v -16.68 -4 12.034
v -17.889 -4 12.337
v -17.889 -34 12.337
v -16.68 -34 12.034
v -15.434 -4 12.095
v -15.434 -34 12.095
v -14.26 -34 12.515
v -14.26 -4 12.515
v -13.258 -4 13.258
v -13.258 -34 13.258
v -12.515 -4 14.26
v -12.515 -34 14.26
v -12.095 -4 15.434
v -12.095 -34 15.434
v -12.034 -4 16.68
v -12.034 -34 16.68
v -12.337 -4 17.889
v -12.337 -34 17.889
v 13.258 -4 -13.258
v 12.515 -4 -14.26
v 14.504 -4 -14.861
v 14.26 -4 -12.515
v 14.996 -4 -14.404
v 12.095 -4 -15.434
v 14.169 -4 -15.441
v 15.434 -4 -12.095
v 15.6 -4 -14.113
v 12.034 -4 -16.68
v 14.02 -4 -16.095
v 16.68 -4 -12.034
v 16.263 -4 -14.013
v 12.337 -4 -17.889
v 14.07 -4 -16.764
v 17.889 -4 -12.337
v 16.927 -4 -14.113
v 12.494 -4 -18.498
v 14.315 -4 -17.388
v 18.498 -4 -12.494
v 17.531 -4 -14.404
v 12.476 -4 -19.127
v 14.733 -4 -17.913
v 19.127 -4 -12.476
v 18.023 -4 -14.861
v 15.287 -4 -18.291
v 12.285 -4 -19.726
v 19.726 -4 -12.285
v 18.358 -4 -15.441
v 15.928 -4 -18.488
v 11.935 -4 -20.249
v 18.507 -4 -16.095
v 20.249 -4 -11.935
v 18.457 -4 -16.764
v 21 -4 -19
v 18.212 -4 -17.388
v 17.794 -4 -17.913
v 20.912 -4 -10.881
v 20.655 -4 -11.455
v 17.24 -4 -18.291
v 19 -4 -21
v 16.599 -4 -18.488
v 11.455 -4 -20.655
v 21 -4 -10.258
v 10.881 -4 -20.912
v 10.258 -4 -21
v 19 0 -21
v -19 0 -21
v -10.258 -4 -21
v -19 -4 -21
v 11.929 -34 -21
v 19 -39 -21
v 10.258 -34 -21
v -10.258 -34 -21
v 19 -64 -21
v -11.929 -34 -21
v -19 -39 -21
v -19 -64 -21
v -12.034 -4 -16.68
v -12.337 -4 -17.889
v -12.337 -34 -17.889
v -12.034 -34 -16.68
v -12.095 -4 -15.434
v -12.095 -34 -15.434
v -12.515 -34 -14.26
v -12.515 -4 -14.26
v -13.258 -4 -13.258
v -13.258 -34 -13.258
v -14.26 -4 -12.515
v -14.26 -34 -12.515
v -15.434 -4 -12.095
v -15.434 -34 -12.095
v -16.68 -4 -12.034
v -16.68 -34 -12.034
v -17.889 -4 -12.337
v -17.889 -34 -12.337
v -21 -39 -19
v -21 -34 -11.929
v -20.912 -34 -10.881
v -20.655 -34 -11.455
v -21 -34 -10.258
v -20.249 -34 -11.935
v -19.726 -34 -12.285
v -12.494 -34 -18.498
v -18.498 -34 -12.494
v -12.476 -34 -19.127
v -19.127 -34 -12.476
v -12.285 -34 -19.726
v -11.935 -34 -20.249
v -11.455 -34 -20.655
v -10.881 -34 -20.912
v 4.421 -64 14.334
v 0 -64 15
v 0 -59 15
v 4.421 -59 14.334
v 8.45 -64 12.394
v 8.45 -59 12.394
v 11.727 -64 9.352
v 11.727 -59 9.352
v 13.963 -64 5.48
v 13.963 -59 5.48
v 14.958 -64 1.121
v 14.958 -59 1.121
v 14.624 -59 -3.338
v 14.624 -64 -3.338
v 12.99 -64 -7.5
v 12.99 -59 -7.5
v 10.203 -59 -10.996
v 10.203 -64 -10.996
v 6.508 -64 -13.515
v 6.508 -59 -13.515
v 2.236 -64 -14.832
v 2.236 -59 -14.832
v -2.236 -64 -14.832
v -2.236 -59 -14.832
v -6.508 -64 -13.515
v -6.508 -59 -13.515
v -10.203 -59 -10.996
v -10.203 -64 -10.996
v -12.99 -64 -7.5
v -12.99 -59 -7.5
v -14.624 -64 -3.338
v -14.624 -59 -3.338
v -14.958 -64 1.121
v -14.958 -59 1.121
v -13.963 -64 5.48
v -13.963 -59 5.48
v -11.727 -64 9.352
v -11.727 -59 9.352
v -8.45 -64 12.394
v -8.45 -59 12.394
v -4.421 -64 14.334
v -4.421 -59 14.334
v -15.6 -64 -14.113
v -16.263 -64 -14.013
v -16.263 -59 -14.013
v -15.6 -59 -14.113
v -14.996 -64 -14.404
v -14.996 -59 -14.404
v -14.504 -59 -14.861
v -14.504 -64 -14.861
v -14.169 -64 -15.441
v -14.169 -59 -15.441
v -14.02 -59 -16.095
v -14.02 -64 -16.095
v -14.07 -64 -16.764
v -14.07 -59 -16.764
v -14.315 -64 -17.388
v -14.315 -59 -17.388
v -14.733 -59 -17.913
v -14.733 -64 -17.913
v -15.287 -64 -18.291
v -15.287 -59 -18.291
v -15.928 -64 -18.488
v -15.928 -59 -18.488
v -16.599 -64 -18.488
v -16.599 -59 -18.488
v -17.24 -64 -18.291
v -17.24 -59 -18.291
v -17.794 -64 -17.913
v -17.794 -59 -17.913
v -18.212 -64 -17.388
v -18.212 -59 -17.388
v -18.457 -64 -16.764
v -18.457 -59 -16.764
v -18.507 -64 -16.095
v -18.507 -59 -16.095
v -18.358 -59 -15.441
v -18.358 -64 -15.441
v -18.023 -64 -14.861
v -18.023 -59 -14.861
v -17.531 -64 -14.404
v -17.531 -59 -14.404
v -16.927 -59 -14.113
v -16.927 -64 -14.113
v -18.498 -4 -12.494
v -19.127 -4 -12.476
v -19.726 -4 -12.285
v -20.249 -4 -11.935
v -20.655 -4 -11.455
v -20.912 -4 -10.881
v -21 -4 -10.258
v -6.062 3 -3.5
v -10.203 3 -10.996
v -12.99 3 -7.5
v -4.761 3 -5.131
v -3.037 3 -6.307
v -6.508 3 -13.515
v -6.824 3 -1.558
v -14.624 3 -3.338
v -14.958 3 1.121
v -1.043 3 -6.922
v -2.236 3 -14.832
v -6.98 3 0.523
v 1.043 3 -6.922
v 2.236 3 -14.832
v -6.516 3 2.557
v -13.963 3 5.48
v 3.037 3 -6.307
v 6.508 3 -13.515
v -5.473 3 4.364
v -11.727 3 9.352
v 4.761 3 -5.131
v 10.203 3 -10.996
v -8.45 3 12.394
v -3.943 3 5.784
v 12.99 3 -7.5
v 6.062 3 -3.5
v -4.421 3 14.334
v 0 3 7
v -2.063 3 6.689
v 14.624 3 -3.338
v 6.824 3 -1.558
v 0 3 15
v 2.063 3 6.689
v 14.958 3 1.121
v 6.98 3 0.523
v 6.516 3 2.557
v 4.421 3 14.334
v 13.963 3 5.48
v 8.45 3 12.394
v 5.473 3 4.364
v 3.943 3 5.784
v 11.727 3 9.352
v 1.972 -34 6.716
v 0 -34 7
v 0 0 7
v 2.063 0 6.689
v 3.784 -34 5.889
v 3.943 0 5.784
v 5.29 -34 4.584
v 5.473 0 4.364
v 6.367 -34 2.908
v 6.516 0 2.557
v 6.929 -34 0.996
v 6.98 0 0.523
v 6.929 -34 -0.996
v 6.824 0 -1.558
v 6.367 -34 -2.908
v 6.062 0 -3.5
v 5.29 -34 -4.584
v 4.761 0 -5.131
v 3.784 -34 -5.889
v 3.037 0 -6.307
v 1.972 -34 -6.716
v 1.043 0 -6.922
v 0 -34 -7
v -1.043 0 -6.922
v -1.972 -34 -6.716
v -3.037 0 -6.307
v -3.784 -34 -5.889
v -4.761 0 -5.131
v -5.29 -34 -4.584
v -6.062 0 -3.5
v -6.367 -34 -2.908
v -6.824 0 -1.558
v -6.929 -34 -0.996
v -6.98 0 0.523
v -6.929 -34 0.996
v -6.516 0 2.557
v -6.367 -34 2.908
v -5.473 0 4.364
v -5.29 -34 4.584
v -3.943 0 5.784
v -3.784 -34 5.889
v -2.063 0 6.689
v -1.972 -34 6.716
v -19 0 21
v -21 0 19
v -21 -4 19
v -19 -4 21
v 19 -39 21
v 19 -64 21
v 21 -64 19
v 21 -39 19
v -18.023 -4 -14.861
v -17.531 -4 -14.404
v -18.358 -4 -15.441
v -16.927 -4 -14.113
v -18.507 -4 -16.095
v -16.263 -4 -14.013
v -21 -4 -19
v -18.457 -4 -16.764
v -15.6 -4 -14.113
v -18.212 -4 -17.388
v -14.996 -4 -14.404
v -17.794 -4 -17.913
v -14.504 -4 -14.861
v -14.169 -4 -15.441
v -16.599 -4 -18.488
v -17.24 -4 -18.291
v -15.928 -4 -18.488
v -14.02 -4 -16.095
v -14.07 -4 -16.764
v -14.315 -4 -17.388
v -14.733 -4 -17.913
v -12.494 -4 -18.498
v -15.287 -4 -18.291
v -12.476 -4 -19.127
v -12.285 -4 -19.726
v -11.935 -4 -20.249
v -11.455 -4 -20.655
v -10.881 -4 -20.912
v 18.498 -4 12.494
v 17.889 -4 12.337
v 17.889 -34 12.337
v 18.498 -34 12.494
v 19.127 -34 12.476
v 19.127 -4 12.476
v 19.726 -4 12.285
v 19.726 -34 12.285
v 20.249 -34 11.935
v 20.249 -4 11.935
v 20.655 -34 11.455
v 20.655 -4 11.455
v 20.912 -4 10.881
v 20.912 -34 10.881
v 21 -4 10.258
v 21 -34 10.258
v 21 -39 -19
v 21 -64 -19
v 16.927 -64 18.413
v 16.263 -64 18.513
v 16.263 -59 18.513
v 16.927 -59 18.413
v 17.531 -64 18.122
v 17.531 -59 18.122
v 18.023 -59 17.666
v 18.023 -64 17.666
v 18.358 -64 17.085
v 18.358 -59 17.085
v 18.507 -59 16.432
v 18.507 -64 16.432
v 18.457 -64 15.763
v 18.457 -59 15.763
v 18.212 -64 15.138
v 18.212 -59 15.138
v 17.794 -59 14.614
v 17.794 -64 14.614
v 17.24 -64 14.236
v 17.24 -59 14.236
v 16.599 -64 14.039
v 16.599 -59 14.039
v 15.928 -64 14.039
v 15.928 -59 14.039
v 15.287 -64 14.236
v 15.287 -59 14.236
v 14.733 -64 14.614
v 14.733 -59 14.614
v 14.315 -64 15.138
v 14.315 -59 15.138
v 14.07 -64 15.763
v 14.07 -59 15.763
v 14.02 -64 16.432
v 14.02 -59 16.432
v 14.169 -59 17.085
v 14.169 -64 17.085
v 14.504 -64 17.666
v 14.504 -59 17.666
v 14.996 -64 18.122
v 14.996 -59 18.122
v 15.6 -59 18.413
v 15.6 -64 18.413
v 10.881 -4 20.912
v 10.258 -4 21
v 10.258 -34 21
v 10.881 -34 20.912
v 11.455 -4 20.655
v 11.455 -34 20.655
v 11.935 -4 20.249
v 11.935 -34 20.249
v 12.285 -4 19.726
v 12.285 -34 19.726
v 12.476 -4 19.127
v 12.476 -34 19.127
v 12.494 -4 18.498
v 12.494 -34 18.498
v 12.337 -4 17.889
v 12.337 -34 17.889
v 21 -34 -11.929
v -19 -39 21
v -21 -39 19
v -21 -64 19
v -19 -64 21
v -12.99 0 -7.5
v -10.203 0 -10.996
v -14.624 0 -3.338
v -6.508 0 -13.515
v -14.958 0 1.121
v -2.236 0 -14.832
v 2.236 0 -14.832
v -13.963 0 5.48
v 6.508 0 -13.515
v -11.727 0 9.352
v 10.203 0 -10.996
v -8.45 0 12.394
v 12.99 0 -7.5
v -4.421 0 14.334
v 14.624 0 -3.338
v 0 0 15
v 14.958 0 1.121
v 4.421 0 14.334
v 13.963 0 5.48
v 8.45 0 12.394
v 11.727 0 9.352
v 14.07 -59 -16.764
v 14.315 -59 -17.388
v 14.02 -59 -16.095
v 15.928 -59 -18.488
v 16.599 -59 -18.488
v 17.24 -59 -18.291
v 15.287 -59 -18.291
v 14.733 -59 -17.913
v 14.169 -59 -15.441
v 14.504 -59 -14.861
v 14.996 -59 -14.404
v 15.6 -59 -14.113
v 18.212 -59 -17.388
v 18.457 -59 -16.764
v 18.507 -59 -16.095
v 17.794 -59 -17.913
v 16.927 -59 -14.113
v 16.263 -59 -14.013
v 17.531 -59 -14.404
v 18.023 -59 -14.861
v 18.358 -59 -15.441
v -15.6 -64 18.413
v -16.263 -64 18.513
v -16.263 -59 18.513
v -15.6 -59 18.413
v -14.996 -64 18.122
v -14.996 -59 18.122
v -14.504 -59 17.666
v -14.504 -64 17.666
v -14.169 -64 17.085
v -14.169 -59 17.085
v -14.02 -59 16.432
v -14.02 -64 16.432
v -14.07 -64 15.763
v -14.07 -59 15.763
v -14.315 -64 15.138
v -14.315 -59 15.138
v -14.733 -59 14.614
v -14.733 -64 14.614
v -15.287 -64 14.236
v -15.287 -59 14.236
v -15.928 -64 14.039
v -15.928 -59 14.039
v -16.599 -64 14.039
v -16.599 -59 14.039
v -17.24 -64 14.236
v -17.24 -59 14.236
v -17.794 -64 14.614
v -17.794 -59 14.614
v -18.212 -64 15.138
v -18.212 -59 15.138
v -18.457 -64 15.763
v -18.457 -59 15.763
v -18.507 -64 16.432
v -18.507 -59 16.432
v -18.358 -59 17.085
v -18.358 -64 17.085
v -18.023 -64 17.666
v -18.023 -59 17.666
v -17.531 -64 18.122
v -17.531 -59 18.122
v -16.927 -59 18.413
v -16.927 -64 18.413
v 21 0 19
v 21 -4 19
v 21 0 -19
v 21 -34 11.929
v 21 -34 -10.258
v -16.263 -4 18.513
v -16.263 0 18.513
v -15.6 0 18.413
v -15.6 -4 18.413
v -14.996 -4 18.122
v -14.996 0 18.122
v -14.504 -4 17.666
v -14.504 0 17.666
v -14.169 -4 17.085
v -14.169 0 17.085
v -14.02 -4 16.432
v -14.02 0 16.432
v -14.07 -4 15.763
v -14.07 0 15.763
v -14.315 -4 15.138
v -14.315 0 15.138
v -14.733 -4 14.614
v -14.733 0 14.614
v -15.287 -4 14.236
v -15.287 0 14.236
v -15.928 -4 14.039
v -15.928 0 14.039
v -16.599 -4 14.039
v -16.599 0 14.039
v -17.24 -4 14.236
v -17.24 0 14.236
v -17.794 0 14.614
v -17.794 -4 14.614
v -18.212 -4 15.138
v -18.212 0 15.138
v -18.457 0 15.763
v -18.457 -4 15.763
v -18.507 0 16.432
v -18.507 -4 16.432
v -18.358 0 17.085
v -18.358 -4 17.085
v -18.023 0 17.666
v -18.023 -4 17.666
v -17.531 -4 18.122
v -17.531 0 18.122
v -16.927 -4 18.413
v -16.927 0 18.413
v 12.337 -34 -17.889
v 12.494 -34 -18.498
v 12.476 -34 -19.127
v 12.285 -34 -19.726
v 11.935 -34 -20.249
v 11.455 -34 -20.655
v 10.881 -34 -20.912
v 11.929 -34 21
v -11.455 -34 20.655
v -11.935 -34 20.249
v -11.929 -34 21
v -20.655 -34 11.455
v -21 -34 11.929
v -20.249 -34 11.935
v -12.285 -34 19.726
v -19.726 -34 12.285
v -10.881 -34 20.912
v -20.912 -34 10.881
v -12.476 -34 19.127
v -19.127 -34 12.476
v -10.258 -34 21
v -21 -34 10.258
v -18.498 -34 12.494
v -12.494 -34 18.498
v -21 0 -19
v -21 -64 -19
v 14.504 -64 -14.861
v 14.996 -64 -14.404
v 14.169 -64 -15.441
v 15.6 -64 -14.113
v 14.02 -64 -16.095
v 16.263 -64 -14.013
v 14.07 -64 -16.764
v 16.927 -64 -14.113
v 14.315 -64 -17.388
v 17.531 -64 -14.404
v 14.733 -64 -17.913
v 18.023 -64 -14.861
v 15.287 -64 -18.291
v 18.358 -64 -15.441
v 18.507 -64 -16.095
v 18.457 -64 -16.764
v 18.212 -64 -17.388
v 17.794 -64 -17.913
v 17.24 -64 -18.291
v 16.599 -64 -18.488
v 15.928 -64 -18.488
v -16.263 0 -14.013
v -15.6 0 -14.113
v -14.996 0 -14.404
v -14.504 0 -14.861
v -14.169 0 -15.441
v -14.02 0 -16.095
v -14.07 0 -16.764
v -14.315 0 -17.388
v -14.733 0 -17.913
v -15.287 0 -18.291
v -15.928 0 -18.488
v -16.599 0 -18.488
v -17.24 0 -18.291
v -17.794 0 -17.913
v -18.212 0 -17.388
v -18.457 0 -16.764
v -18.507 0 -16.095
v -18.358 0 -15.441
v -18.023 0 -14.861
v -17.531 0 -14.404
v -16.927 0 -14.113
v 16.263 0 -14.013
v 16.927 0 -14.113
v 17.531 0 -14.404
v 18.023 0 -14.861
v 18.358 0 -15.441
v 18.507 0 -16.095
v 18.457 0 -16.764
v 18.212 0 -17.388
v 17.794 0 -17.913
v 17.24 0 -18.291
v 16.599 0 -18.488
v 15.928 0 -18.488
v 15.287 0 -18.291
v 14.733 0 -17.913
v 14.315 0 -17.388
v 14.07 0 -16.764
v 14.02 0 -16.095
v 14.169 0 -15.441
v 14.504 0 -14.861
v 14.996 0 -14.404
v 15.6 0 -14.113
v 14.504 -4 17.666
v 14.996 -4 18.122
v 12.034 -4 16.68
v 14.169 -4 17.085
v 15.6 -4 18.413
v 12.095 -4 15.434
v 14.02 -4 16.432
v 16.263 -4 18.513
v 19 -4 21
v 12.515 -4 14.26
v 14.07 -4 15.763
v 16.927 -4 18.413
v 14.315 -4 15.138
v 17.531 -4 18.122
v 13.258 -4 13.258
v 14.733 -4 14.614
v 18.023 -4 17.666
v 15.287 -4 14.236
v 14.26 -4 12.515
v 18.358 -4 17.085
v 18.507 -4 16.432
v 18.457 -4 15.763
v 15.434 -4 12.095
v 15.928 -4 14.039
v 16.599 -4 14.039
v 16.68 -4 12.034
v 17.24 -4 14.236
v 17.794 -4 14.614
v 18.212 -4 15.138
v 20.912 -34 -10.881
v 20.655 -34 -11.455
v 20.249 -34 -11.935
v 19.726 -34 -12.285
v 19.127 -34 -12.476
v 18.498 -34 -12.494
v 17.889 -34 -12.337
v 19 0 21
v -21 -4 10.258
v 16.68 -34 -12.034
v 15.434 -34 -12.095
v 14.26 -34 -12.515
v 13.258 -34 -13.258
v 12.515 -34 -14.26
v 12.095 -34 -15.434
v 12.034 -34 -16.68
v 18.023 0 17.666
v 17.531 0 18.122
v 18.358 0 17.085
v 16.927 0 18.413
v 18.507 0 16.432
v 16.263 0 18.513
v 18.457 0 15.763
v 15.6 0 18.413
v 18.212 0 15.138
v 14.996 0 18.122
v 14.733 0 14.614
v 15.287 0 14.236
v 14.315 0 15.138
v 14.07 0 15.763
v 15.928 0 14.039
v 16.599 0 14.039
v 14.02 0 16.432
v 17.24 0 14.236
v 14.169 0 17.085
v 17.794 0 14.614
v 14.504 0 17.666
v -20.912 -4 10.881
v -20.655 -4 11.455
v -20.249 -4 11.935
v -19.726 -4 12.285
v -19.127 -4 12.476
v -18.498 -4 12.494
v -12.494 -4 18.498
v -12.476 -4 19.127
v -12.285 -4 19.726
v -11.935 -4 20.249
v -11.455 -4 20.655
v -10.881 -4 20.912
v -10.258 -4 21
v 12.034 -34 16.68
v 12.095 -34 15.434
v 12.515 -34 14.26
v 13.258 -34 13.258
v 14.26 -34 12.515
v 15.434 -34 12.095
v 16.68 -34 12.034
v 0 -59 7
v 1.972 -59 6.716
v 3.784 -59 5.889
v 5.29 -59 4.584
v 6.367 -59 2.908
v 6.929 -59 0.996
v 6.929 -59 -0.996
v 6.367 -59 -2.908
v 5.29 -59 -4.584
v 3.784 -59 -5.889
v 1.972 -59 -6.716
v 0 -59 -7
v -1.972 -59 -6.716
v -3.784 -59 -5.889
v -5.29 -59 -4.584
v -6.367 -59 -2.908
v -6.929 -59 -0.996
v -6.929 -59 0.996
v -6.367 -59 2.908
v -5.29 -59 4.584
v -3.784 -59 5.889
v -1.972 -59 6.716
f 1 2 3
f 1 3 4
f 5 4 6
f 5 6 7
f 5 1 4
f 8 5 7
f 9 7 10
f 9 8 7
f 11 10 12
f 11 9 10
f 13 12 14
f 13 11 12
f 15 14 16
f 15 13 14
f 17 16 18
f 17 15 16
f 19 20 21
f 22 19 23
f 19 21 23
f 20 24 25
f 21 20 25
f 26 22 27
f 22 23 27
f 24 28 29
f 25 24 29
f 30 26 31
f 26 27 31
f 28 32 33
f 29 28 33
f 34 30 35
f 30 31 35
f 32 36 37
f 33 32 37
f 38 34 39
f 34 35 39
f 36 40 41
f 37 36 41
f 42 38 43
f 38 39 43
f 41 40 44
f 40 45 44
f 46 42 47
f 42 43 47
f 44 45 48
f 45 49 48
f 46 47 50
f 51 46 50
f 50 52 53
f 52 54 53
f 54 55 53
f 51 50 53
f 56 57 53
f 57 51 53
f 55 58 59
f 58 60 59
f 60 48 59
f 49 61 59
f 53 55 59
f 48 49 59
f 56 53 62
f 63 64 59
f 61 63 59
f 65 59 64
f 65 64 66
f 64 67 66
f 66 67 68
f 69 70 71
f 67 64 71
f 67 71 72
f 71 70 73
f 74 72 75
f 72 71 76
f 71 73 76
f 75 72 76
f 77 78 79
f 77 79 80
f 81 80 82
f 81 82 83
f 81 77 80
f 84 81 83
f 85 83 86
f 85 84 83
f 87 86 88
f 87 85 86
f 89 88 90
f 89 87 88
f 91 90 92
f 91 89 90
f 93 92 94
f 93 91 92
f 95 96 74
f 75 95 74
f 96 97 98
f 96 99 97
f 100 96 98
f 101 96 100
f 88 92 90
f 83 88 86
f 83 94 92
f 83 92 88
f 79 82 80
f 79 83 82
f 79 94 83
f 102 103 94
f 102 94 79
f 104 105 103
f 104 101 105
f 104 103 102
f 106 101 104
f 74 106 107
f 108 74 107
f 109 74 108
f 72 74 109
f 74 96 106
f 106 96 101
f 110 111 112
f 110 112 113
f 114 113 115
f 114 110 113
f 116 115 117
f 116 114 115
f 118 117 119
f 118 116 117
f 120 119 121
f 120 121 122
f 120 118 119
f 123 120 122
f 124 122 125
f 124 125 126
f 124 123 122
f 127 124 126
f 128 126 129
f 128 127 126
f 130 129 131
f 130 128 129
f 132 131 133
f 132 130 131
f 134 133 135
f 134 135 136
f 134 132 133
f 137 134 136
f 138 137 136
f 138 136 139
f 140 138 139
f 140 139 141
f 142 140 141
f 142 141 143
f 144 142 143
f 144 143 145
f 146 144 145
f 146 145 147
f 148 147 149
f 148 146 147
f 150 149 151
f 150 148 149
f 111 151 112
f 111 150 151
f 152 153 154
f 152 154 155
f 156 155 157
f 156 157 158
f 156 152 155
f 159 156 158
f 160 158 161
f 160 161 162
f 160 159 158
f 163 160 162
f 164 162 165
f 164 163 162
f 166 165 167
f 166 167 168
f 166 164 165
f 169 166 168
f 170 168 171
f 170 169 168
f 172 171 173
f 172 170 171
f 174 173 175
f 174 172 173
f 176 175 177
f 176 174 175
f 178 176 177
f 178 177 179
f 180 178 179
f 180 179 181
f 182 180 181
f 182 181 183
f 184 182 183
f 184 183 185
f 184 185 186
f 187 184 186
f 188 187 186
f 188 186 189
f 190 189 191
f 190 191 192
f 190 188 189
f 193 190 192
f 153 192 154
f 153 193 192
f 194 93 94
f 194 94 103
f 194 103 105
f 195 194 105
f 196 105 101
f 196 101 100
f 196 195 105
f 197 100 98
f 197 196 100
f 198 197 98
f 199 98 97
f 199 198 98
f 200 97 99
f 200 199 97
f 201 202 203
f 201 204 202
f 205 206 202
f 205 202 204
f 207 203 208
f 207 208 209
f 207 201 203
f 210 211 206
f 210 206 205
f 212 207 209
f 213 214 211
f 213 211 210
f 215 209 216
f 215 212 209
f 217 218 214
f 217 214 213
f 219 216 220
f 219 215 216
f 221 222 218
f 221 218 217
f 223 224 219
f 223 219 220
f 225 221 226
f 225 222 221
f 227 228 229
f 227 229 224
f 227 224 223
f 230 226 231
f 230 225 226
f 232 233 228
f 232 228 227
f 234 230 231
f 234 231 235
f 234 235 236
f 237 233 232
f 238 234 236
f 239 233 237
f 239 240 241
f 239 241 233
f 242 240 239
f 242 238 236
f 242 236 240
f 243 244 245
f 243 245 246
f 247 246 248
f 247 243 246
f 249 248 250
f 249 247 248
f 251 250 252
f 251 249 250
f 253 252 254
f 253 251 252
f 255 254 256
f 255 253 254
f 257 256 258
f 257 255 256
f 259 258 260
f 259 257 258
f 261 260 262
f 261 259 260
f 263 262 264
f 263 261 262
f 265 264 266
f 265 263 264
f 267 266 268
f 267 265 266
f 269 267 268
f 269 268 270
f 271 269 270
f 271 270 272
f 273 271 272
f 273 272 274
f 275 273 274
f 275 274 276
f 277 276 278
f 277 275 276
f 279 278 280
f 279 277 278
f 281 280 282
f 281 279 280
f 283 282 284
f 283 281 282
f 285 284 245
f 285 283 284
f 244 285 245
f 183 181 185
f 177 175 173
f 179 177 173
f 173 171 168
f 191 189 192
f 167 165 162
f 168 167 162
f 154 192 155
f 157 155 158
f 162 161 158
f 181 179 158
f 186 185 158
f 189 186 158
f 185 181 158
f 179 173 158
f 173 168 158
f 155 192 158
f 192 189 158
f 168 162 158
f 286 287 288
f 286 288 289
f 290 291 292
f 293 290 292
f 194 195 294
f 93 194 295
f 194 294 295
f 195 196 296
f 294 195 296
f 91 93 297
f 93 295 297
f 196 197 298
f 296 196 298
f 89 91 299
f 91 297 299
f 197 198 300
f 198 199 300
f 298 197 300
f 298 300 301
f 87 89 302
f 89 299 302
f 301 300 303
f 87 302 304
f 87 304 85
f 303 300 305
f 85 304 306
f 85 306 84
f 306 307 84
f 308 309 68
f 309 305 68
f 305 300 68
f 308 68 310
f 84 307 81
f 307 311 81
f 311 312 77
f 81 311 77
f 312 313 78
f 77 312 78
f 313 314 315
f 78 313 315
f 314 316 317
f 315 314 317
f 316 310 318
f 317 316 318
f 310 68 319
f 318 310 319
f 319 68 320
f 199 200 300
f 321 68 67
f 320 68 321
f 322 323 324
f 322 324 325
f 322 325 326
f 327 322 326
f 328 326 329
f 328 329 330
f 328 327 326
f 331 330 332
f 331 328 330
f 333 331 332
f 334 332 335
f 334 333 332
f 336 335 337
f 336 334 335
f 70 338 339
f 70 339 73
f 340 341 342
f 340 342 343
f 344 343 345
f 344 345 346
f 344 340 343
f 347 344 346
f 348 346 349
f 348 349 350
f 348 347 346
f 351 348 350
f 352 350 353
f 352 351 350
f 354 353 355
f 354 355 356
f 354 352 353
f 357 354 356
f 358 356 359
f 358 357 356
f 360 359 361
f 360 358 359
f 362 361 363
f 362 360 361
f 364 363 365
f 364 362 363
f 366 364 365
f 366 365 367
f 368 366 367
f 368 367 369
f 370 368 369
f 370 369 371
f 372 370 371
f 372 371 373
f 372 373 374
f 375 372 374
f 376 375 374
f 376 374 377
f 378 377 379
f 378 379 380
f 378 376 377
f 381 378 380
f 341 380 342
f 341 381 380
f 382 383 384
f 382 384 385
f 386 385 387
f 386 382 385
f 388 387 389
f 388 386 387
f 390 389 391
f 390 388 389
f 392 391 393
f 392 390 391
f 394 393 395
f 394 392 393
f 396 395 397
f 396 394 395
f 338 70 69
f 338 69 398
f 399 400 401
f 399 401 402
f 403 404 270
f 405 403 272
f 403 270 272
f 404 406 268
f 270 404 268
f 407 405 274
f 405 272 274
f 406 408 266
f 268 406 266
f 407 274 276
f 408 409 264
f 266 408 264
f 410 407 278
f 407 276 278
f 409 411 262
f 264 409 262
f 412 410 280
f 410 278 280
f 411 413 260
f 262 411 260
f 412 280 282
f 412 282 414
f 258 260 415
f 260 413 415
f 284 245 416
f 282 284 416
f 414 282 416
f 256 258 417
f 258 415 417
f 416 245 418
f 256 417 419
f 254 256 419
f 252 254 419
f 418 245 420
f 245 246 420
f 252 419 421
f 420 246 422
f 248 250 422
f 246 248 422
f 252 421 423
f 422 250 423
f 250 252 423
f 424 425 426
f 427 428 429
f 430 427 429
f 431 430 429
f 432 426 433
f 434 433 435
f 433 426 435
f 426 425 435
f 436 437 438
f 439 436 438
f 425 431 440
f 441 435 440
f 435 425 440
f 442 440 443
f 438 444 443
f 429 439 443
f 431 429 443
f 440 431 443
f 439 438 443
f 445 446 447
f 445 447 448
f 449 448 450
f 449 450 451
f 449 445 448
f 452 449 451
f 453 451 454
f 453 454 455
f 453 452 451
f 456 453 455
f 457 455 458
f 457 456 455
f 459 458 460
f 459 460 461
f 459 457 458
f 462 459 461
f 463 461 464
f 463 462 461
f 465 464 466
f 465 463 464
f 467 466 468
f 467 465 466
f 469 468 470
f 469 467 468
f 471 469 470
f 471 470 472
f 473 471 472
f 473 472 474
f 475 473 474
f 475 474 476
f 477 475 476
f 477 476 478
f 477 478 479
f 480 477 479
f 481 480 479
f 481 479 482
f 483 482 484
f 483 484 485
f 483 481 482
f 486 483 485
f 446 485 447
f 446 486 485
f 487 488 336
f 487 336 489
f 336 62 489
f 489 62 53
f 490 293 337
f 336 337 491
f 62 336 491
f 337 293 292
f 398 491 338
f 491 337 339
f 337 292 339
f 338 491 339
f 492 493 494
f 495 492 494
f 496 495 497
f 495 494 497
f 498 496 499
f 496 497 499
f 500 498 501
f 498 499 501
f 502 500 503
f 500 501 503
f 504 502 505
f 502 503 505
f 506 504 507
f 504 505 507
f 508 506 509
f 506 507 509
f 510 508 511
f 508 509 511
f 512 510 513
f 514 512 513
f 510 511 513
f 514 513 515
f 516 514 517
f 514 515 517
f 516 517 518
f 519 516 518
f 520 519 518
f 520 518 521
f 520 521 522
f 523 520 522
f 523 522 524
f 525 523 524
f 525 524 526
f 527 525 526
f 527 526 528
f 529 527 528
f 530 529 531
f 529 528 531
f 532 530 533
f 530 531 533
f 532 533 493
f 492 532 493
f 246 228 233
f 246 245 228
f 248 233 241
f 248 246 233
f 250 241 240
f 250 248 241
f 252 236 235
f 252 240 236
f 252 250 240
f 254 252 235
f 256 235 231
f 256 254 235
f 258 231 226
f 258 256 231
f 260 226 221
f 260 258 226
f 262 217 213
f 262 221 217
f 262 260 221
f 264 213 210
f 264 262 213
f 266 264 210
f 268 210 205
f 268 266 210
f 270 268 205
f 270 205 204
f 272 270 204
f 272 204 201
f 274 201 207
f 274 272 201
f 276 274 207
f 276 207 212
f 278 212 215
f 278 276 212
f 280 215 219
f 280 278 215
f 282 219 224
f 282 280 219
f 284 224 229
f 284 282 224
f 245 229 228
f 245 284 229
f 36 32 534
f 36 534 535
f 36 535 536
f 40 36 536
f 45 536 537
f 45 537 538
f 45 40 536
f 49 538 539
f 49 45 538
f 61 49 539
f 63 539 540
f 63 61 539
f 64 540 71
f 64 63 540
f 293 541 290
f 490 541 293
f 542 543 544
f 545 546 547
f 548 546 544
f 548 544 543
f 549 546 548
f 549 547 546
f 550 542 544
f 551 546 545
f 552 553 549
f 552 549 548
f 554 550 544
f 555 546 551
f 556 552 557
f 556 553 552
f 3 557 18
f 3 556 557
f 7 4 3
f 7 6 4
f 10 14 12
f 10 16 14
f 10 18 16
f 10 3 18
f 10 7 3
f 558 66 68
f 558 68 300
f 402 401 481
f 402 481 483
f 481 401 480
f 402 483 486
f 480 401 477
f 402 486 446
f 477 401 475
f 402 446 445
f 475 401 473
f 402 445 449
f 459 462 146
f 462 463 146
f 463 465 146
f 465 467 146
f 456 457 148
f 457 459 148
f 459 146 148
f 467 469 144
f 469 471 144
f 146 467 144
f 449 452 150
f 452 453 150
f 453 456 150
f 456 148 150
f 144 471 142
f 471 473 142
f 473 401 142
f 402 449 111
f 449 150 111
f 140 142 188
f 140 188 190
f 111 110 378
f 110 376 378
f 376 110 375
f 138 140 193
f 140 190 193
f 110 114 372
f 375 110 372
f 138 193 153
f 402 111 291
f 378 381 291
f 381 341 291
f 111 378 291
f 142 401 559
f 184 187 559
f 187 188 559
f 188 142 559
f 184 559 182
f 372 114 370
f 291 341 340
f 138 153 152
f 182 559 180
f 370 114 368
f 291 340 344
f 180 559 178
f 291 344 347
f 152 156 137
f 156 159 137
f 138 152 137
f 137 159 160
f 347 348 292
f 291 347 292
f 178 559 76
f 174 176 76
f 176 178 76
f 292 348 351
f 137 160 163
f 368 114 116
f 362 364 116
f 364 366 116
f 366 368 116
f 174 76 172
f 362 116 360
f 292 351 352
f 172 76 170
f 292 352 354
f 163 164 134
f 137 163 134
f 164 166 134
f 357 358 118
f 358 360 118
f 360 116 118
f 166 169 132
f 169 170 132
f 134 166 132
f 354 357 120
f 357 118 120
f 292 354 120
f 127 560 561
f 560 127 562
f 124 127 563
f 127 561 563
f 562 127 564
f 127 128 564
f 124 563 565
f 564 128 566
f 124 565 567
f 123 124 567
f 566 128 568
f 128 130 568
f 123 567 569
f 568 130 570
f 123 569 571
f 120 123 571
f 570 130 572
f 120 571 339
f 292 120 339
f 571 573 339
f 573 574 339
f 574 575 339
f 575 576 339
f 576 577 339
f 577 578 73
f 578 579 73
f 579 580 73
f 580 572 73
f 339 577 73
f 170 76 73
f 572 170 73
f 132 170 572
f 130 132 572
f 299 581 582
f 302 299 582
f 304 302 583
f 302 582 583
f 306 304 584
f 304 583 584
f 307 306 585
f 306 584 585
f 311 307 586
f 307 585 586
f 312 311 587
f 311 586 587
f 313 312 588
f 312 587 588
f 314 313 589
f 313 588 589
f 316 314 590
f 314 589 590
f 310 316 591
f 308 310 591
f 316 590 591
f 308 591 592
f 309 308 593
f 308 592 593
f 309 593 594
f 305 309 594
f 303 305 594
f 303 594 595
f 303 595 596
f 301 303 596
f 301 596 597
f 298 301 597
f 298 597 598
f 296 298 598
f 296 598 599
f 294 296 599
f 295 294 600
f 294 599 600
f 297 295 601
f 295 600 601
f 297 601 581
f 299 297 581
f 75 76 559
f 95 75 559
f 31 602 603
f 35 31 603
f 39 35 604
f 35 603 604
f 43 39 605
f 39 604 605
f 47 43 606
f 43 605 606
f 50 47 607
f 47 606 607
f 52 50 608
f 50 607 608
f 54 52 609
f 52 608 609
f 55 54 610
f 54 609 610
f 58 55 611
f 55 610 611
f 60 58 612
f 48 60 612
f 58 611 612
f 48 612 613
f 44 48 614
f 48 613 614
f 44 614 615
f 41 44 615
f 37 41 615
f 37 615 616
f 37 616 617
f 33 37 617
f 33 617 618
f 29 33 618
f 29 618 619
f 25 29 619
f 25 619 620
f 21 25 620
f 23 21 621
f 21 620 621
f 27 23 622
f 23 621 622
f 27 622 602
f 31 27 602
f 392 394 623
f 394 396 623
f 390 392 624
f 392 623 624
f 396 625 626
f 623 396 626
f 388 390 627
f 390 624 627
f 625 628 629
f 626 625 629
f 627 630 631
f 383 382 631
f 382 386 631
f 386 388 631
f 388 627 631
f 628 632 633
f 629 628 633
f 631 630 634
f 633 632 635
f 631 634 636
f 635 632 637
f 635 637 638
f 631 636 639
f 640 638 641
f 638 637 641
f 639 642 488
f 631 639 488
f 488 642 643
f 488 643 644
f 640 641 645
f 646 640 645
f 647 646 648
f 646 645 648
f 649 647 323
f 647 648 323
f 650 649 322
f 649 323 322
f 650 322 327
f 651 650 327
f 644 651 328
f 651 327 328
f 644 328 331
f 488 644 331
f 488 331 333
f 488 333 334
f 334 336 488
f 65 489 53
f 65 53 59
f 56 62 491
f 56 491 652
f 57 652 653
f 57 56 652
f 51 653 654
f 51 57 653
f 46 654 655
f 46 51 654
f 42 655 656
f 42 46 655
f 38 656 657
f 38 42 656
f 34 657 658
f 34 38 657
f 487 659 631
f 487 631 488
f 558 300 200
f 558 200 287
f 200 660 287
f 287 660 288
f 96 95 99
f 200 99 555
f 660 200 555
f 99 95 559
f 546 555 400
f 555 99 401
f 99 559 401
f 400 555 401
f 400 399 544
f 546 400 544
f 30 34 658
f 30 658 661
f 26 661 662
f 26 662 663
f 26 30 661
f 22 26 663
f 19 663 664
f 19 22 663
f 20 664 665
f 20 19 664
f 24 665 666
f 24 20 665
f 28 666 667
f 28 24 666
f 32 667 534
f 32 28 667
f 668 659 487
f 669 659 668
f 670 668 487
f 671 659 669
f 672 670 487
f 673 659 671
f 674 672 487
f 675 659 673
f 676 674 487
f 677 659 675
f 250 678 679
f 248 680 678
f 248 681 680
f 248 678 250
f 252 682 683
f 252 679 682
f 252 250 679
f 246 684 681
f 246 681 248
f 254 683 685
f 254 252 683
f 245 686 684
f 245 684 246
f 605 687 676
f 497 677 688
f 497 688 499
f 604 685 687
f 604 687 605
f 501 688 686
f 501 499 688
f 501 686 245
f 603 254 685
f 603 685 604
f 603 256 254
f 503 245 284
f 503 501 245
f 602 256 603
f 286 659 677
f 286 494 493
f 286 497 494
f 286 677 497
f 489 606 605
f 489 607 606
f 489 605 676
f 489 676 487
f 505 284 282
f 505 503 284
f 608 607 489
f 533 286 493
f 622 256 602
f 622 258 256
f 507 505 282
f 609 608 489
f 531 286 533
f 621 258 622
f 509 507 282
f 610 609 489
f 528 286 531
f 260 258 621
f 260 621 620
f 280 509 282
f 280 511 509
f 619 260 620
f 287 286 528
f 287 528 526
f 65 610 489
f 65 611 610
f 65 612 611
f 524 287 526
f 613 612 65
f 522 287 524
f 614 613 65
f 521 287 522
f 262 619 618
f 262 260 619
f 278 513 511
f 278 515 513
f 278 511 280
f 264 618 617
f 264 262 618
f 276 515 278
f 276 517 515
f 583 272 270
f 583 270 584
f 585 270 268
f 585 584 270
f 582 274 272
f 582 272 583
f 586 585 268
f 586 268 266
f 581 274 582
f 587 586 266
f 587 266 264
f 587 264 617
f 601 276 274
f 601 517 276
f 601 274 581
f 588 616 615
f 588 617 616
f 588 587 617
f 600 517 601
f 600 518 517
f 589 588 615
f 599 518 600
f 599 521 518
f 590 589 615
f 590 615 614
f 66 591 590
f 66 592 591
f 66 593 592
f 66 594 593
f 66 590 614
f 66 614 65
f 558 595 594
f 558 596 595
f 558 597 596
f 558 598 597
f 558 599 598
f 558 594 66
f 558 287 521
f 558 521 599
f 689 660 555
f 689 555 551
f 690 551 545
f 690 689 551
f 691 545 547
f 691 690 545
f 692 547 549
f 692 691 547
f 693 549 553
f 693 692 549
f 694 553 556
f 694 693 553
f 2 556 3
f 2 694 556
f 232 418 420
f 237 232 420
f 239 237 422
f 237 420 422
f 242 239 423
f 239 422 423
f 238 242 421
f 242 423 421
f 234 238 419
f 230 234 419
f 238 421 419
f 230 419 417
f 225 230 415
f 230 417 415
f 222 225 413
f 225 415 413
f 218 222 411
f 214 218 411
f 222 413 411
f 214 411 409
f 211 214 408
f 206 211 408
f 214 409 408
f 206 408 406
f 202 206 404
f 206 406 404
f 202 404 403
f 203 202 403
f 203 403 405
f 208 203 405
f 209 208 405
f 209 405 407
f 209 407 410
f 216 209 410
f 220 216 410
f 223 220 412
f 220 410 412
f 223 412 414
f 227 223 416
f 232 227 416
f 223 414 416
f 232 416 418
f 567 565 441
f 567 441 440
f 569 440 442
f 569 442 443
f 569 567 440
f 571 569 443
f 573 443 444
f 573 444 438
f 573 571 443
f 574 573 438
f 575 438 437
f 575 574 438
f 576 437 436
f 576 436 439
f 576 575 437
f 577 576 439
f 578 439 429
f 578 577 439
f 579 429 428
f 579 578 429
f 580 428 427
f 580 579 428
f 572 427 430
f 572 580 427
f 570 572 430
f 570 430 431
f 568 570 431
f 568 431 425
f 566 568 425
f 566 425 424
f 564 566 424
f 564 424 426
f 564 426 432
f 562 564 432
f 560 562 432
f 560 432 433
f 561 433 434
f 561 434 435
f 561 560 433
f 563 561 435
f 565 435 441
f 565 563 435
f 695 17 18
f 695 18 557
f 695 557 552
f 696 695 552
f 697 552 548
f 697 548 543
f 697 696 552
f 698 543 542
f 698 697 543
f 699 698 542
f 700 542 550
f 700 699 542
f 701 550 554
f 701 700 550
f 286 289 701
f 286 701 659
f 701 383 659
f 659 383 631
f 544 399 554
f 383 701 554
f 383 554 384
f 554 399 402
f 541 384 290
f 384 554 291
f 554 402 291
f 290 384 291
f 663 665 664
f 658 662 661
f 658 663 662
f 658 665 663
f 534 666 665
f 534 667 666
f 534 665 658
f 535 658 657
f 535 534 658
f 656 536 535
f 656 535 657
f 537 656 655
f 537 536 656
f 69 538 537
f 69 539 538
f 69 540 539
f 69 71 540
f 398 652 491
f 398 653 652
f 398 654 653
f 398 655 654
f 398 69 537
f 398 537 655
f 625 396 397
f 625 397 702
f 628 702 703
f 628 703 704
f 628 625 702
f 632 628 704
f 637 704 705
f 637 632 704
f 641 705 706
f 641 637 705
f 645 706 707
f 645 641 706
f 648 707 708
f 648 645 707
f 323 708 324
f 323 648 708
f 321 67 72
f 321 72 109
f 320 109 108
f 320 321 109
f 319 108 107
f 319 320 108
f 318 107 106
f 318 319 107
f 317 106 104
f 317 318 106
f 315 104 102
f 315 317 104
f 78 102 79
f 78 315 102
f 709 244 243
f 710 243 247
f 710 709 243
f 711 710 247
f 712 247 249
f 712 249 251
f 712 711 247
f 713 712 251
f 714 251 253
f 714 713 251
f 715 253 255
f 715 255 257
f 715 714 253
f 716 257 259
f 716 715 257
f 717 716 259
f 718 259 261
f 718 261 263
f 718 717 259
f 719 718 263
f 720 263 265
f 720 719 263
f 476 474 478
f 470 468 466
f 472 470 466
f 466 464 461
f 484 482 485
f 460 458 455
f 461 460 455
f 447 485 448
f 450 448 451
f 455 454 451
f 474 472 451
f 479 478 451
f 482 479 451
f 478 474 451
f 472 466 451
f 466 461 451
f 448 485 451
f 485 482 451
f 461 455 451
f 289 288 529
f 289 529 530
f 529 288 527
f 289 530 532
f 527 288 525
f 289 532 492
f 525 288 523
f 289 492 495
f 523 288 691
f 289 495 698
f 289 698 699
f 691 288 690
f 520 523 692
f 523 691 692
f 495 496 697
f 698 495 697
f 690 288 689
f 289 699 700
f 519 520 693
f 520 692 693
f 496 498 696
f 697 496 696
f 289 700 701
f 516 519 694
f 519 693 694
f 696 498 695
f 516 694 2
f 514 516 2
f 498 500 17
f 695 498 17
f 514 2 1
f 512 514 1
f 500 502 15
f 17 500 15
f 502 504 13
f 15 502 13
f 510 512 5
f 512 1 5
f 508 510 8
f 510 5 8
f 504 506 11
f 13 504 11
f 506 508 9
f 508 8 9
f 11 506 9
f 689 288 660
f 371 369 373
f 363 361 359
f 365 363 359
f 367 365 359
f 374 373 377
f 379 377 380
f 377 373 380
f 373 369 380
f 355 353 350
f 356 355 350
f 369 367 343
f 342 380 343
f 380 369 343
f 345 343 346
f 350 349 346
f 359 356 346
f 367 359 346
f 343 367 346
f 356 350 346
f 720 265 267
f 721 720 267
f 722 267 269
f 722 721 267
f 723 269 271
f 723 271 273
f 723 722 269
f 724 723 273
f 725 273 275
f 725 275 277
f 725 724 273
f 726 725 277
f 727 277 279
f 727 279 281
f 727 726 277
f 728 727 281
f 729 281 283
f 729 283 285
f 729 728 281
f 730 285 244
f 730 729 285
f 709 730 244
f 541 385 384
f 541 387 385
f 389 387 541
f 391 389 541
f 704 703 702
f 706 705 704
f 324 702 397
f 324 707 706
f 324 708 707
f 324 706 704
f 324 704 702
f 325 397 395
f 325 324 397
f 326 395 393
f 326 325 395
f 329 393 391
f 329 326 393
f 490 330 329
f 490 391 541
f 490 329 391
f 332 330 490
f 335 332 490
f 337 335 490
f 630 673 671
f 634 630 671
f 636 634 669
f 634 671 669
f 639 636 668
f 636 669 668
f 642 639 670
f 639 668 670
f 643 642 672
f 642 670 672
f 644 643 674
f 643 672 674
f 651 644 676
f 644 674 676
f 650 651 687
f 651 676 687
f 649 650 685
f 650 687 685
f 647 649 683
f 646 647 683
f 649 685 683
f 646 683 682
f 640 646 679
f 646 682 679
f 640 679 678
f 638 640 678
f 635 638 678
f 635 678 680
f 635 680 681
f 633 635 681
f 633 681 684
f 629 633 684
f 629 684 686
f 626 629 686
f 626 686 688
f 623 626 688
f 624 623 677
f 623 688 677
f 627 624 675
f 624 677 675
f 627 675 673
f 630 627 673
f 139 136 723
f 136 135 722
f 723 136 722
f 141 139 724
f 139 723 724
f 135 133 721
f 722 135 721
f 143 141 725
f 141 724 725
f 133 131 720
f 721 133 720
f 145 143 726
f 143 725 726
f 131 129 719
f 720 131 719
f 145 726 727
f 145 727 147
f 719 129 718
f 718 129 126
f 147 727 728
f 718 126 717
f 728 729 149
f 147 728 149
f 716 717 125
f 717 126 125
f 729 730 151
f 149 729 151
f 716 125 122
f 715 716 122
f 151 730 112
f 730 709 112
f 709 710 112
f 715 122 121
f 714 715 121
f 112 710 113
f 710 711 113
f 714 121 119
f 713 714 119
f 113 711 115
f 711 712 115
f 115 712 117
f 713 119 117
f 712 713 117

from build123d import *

# Parameters (mm, degrees)
SKETCH1_R           = 7
BOSS_EXTRUDE1_DEPTH = 26
SKETCH1_3_R         = 15
SKETCH1_3_R_2       = 7
BOSS_EXTRUDE2_DEPTH = 3
SKETCH1_4_R         = 15
SKETCH1_4_R_2       = 2.25
SKETCH1_4_R_3       = 7
BOSS_EXTRUDE3_DEPTH = 4
BOSS_EXTRUDE4_DEPTH = 30
BOSS_EXTRUDE6_START = -64
SKETCH1_6_R         = 15
SKETCH1_6_R_2       = 2.25
SKETCH1_6_R_3       = 7
BOSS_EXTRUDE6_DEPTH = 30
CUT_EXTRUDE3_START  = -64
SKETCH1_7_R         = 2.25
CUT_EXTRUDE3_DEPTH  = 5
CUT_EXTRUDE4_START  = -64
SKETCH1_8_R         = 15
SKETCH1_8_R_2       = 7
CUT_EXTRUDE4_DEPTH  = 5
CHAMFER1_START      = 4.04163056
CHAMFER1_DEPTH      = 3.535533906
CHAMFER2_START      = -7.577164466
CHAMFER2_DEPTH      = 3.535533906
CHAMFER3_START      = 4.04163056
CHAMFER3_DEPTH      = 3.535533906
CHAMFER4_START      = -7.577164466
CHAMFER4_DEPTH      = 3.535533906
CUT_EXTRUDE5_START  = -85
SKETCH4_R           = 7
CUT_EXTRUDE5_DEPTH  = 85


with BuildPart() as part:
    # Sketch1 → Boss-Extrude1 (new body)
    with BuildSketch(Plane(origin=(0, 0, 0), x_dir=(1, 0, 0), z_dir=(0, 1, 0))):
        with Locations(Location((0, 0, 0), (0, 0, 90))):
            Circle(SKETCH1_R)
    extrude(amount=BOSS_EXTRUDE1_DEPTH)

    # Sketch1<3> → Boss-Extrude2 (add)
    with BuildSketch(Plane(origin=(0, 0, 0), x_dir=(1, 0, 0), z_dir=(0, 1, 0))):
        with Locations(Location((0, 0, 0), (0, 0, 270))):
            Circle(SKETCH1_3_R)
        with Locations(Location((0, 0, 0), (0, 0, 90))):
            Circle(SKETCH1_3_R_2, mode=Mode.SUBTRACT)
    extrude(amount=BOSS_EXTRUDE2_DEPTH)


with BuildPart() as body_2:
    # Sketch1<4> → Boss-Extrude3 (new body)
    # profile 1 of 3: a face of its own
    with BuildSketch(Plane(origin=(0, 0, 0), x_dir=(1, 0, 0), z_dir=(0, 1, 0))):
        Polygon((-19, -21), (19, -21), (21, -19), (21, 19), (19, 21), (-19, 21), (-21, 19), (-21, -19), align=None)
        with Locations(Location((0, 0, 0), (0, 0, 270))):
            Circle(SKETCH1_4_R, mode=Mode.SUBTRACT)
        with Locations(Location((16.263455967, -16.263455967, 0), (0, 0, 270))):
            Circle(SKETCH1_4_R_2, mode=Mode.SUBTRACT)
        with Locations(Location((16.263455967, 16.263455967, 0), (0, 0, 270))):
            Circle(SKETCH1_4_R_2, mode=Mode.SUBTRACT)
        with Locations(Location((-16.263455967, 16.263455967, 0), (0, 0, 270))):
            Circle(SKETCH1_4_R_2, mode=Mode.SUBTRACT)
        with Locations(Location((-16.263455967, -16.263455967, 0), (0, 0, 270))):
            Circle(SKETCH1_4_R_2, mode=Mode.SUBTRACT)
    # profile 2 of 3: a face of its own
    with BuildSketch(Plane(origin=(0, 0, 0), x_dir=(1, 0, 0), z_dir=(0, 1, 0))):
        with Locations(Location((0, 0, 0), (0, 0, 270))):
            Circle(SKETCH1_4_R)
        with Locations(Location((0, 0, 0), (0, 0, 90))):
            Circle(SKETCH1_4_R_3, mode=Mode.SUBTRACT)
    # profile 3 of 3: a face of its own
    with BuildSketch(Plane(origin=(0, 0, 0), x_dir=(1, 0, 0), z_dir=(0, 1, 0))):
        with Locations(Location((0, 0, 0), (0, 0, 90))):
            Circle(SKETCH1_4_R_3)
    extrude(amount=-BOSS_EXTRUDE3_DEPTH)

    # Sketch3 → Boss-Extrude4 (add)
    with BuildSketch(Plane.XZ.offset(4)):
        with BuildLine():
            Line((-10.257867006, 21), (10.257867006, 21))
            ThreePointArc((10.257867006, 21), (12.128580139, 20.000172937), (12.336724723, 17.889273219))
            ThreePointArc((12.336724723, 17.889273219), (13.258252147, 13.258252147), (17.889273219, 12.336724723))
            ThreePointArc((17.889273219, 12.336724723), (20.000172937, 12.128580139), (21, 10.257867006))
            Line((21, 10.257867006), (21, -10.257867006))
            ThreePointArc((21, -10.257867006), (20.000172937, -12.128580139), (17.889273219, -12.336724723))
            ThreePointArc((17.889273219, -12.336724723), (13.258252147, -13.258252147), (12.336724723, -17.889273219))
            ThreePointArc((12.336724723, -17.889273219), (12.128580139, -20.000172937), (10.257867006, -21))
            Line((10.257867006, -21), (-10.257867006, -21))
            ThreePointArc((-10.257867006, -21), (-12.128580139, -20.000172937), (-12.336724723, -17.889273219))
            ThreePointArc((-12.336724723, -17.889273219), (-13.258252147, -13.258252147), (-17.889273219, -12.336724723))
            ThreePointArc((-17.889273219, -12.336724723), (-20.000172937, -12.128580139), (-21, -10.257867006))
            Line((-21, -10.257867006), (-21, 10.257867006))
            ThreePointArc((-21, 10.257867006), (-20.000172937, 12.128580139), (-17.889273219, 12.336724723))
            ThreePointArc((-17.889273219, 12.336724723), (-13.258252147, 13.258252147), (-12.336724723, 17.889273219))
            ThreePointArc((-12.336724723, 17.889273219), (-12.128580139, 20.000172937), (-10.257867006, 21))
        make_face()
    extrude(amount=BOSS_EXTRUDE4_DEPTH)

    # Sketch1<6> → Boss-Extrude6 (add)
    # profile 1 of 6: a face of its own
    with BuildSketch(Plane(origin=(0, 0, 0), x_dir=(1, 0, 0), z_dir=(0, 1, 0)).offset(BOSS_EXTRUDE6_START)):
        Polygon((-19, -21), (19, -21), (21, -19), (21, 19), (19, 21), (-19, 21), (-21, 19), (-21, -19), align=None)
        with Locations(Location((0, 0, 0), (0, 0, 270))):
            Circle(SKETCH1_6_R, mode=Mode.SUBTRACT)
        with Locations(Location((16.263455967, -16.263455967, 0), (0, 0, 270))):
            Circle(SKETCH1_6_R_2, mode=Mode.SUBTRACT)
        with Locations(Location((16.263455967, 16.263455967, 0), (0, 0, 270))):
            Circle(SKETCH1_6_R_2, mode=Mode.SUBTRACT)
        with Locations(Location((-16.263455967, 16.263455967, 0), (0, 0, 270))):
            Circle(SKETCH1_6_R_2, mode=Mode.SUBTRACT)
        with Locations(Location((-16.263455967, -16.263455967, 0), (0, 0, 270))):
            Circle(SKETCH1_6_R_2, mode=Mode.SUBTRACT)
    # profile 2 of 6: a face of its own
    with BuildSketch(Plane(origin=(0, 0, 0), x_dir=(1, 0, 0), z_dir=(0, 1, 0)).offset(BOSS_EXTRUDE6_START)):
        with Locations(Location((-16.263455967, 16.263455967, 0), (0, 0, 270))):
            Circle(SKETCH1_6_R_2)
    # profile 3 of 6: a face of its own
    with BuildSketch(Plane(origin=(0, 0, 0), x_dir=(1, 0, 0), z_dir=(0, 1, 0)).offset(BOSS_EXTRUDE6_START)):
        with Locations(Location((16.263455967, 16.263455967, 0), (0, 0, 270))):
            Circle(SKETCH1_6_R_2)
    # profile 4 of 6: a face of its own
    with BuildSketch(Plane(origin=(0, 0, 0), x_dir=(1, 0, 0), z_dir=(0, 1, 0)).offset(BOSS_EXTRUDE6_START)):
        with Locations(Location((16.263455967, -16.263455967, 0), (0, 0, 270))):
            Circle(SKETCH1_6_R_2)
    # profile 5 of 6: a face of its own
    with BuildSketch(Plane(origin=(0, 0, 0), x_dir=(1, 0, 0), z_dir=(0, 1, 0)).offset(BOSS_EXTRUDE6_START)):
        with Locations(Location((-16.263455967, -16.263455967, 0), (0, 0, 270))):
            Circle(SKETCH1_6_R_2)
    # profile 6 of 6: a face of its own
    with BuildSketch(Plane(origin=(0, 0, 0), x_dir=(1, 0, 0), z_dir=(0, 1, 0)).offset(BOSS_EXTRUDE6_START)):
        with Locations(Location((0, 0, 0), (0, 0, 270))):
            Circle(SKETCH1_6_R)
        with Locations(Location((0, 0, 0), (0, 0, 90))):
            Circle(SKETCH1_6_R_3, mode=Mode.SUBTRACT)
    extrude(amount=BOSS_EXTRUDE6_DEPTH)

    # Sketch1<7> → Cut-Extrude3 (cut)
    with BuildSketch(Plane(origin=(0, 0, 0), x_dir=(1, 0, 0), z_dir=(0, 1, 0)).offset(CUT_EXTRUDE3_START)):
        with Locations(Location((-16.263455967, -16.263455967, 0), (0, 0, 270))):
            Circle(SKETCH1_7_R)
        with Locations(Location((-16.263455967, 16.263455967, 0), (0, 0, 270))):
            Circle(SKETCH1_7_R)
        with Locations(Location((16.263455967, 16.263455967, 0), (0, 0, 270))):
            Circle(SKETCH1_7_R)
        with Locations(Location((16.263455967, -16.263455967, 0), (0, 0, 270))):
            Circle(SKETCH1_7_R)
    extrude(amount=CUT_EXTRUDE3_DEPTH, mode=Mode.SUBTRACT)

    # Sketch1<8> → Cut-Extrude4 (cut)
    with BuildSketch(Plane(origin=(0, 0, 0), x_dir=(1, 0, 0), z_dir=(0, 1, 0)).offset(CUT_EXTRUDE4_START)):
        with Locations(Location((0, 0, 0), (0, 0, 270))):
            Circle(SKETCH1_8_R)
        with Locations(Location((0, 0, 0), (0, 0, 270))):
            Circle(SKETCH1_8_R_2, mode=Mode.SUBTRACT)
    extrude(amount=CUT_EXTRUDE4_DEPTH, mode=Mode.SUBTRACT)

    # Chamfer1: read off the stored shape, not the designer's step
    # Chamfer1 outline → Chamfer1 (cut)
    with BuildSketch(Plane(origin=(0, 0, 0), x_dir=(0.8660254037844387, 0.408248290463863, -0.28867513459481264), z_dir=(0.49999999999999983, -0.7071067811865479, 0.49999999999999983)).offset(CHAMFER1_START)):
        Polygon((-18.149022364, -36.776337352), (-28.62338925, -29.369841498), (-28.62338925, -38.030095536), (-26.313988174, -39.663088698), align=None)
    extrude(amount=CHAMFER1_DEPTH, mode=Mode.SUBTRACT)

    # Chamfer2: read off the stored shape, not the designer's step
    # Chamfer2 outline → Chamfer2 (cut)
    with BuildSketch(Plane(origin=(0, 0, 0), x_dir=(0.8660254037844386, -0.40824829046386313, 0.2886751345948132), z_dir=(0.5000000000000002, 0.7071067811865472, -0.5000000000000002)).offset(CHAMFER2_START)):
        Polygon((26.313988174, 39.663088698), (18.149022364, 36.776337352), (28.62338925, 29.369841498), (28.62338925, 38.030095536), align=None)
    extrude(amount=CHAMFER2_DEPTH, mode=Mode.SUBTRACT)

    # Chamfer3: read off the stored shape, not the designer's step
    # Chamfer3 outline → Chamfer3 (cut)
    with BuildSketch(Plane(origin=(0, 0, 0), x_dir=(0.8660254037844386, 0.40824829046386313, 0.2886751345948132), z_dir=(0.5000000000000002, -0.7071067811865472, -0.5000000000000002)).offset(CHAMFER3_START)):
        Polygon((-28.62338925, 29.369841498), (-18.149022364, 36.776337352), (-26.313988174, 39.663088698), (-28.62338925, 38.030095536), align=None)
    extrude(amount=CHAMFER3_DEPTH, mode=Mode.SUBTRACT)

    # Chamfer4: read off the stored shape, not the designer's step
    # Chamfer4 outline → Chamfer4 (cut)
    with BuildSketch(Plane(origin=(0, 0, 0), x_dir=(0.8660254037844387, -0.408248290463863, -0.28867513459481264), z_dir=(0.49999999999999983, 0.7071067811865479, 0.49999999999999983)).offset(CHAMFER4_START)):
        Polygon((28.62338925, -38.030095536), (28.62338925, -29.369841498), (18.149022364, -36.776337352), (26.313988174, -39.663088698), align=None)
    extrude(amount=CHAMFER4_DEPTH, mode=Mode.SUBTRACT)


with BuildPart() as cut_extrude5_tool:
    # Sketch4 → Cut-Extrude5 (new body)
    with BuildSketch(Plane(origin=(0, 26, 0), x_dir=(1, 0, 0), z_dir=(0, 1, 0)).offset(CUT_EXTRUDE5_START)):
        with Locations(Location((0, 0, 0), (0, 0, 270))):
            Circle(SKETCH4_R)
    extrude(amount=CUT_EXTRUDE5_DEPTH)


with BuildPart() as part_1:
    add(part.part)

    # Cut-Extrude5: cut by cut_extrude5_tool
    add(cut_extrude5_tool.part, mode=Mode.SUBTRACT)


with BuildPart() as body_2_1:
    add(body_2.part)

    # Cut-Extrude5: cut by cut_extrude5_tool
    add(cut_extrude5_tool.part, mode=Mode.SUBTRACT)


solid = Compound([part_1.part, body_2_1.part])
